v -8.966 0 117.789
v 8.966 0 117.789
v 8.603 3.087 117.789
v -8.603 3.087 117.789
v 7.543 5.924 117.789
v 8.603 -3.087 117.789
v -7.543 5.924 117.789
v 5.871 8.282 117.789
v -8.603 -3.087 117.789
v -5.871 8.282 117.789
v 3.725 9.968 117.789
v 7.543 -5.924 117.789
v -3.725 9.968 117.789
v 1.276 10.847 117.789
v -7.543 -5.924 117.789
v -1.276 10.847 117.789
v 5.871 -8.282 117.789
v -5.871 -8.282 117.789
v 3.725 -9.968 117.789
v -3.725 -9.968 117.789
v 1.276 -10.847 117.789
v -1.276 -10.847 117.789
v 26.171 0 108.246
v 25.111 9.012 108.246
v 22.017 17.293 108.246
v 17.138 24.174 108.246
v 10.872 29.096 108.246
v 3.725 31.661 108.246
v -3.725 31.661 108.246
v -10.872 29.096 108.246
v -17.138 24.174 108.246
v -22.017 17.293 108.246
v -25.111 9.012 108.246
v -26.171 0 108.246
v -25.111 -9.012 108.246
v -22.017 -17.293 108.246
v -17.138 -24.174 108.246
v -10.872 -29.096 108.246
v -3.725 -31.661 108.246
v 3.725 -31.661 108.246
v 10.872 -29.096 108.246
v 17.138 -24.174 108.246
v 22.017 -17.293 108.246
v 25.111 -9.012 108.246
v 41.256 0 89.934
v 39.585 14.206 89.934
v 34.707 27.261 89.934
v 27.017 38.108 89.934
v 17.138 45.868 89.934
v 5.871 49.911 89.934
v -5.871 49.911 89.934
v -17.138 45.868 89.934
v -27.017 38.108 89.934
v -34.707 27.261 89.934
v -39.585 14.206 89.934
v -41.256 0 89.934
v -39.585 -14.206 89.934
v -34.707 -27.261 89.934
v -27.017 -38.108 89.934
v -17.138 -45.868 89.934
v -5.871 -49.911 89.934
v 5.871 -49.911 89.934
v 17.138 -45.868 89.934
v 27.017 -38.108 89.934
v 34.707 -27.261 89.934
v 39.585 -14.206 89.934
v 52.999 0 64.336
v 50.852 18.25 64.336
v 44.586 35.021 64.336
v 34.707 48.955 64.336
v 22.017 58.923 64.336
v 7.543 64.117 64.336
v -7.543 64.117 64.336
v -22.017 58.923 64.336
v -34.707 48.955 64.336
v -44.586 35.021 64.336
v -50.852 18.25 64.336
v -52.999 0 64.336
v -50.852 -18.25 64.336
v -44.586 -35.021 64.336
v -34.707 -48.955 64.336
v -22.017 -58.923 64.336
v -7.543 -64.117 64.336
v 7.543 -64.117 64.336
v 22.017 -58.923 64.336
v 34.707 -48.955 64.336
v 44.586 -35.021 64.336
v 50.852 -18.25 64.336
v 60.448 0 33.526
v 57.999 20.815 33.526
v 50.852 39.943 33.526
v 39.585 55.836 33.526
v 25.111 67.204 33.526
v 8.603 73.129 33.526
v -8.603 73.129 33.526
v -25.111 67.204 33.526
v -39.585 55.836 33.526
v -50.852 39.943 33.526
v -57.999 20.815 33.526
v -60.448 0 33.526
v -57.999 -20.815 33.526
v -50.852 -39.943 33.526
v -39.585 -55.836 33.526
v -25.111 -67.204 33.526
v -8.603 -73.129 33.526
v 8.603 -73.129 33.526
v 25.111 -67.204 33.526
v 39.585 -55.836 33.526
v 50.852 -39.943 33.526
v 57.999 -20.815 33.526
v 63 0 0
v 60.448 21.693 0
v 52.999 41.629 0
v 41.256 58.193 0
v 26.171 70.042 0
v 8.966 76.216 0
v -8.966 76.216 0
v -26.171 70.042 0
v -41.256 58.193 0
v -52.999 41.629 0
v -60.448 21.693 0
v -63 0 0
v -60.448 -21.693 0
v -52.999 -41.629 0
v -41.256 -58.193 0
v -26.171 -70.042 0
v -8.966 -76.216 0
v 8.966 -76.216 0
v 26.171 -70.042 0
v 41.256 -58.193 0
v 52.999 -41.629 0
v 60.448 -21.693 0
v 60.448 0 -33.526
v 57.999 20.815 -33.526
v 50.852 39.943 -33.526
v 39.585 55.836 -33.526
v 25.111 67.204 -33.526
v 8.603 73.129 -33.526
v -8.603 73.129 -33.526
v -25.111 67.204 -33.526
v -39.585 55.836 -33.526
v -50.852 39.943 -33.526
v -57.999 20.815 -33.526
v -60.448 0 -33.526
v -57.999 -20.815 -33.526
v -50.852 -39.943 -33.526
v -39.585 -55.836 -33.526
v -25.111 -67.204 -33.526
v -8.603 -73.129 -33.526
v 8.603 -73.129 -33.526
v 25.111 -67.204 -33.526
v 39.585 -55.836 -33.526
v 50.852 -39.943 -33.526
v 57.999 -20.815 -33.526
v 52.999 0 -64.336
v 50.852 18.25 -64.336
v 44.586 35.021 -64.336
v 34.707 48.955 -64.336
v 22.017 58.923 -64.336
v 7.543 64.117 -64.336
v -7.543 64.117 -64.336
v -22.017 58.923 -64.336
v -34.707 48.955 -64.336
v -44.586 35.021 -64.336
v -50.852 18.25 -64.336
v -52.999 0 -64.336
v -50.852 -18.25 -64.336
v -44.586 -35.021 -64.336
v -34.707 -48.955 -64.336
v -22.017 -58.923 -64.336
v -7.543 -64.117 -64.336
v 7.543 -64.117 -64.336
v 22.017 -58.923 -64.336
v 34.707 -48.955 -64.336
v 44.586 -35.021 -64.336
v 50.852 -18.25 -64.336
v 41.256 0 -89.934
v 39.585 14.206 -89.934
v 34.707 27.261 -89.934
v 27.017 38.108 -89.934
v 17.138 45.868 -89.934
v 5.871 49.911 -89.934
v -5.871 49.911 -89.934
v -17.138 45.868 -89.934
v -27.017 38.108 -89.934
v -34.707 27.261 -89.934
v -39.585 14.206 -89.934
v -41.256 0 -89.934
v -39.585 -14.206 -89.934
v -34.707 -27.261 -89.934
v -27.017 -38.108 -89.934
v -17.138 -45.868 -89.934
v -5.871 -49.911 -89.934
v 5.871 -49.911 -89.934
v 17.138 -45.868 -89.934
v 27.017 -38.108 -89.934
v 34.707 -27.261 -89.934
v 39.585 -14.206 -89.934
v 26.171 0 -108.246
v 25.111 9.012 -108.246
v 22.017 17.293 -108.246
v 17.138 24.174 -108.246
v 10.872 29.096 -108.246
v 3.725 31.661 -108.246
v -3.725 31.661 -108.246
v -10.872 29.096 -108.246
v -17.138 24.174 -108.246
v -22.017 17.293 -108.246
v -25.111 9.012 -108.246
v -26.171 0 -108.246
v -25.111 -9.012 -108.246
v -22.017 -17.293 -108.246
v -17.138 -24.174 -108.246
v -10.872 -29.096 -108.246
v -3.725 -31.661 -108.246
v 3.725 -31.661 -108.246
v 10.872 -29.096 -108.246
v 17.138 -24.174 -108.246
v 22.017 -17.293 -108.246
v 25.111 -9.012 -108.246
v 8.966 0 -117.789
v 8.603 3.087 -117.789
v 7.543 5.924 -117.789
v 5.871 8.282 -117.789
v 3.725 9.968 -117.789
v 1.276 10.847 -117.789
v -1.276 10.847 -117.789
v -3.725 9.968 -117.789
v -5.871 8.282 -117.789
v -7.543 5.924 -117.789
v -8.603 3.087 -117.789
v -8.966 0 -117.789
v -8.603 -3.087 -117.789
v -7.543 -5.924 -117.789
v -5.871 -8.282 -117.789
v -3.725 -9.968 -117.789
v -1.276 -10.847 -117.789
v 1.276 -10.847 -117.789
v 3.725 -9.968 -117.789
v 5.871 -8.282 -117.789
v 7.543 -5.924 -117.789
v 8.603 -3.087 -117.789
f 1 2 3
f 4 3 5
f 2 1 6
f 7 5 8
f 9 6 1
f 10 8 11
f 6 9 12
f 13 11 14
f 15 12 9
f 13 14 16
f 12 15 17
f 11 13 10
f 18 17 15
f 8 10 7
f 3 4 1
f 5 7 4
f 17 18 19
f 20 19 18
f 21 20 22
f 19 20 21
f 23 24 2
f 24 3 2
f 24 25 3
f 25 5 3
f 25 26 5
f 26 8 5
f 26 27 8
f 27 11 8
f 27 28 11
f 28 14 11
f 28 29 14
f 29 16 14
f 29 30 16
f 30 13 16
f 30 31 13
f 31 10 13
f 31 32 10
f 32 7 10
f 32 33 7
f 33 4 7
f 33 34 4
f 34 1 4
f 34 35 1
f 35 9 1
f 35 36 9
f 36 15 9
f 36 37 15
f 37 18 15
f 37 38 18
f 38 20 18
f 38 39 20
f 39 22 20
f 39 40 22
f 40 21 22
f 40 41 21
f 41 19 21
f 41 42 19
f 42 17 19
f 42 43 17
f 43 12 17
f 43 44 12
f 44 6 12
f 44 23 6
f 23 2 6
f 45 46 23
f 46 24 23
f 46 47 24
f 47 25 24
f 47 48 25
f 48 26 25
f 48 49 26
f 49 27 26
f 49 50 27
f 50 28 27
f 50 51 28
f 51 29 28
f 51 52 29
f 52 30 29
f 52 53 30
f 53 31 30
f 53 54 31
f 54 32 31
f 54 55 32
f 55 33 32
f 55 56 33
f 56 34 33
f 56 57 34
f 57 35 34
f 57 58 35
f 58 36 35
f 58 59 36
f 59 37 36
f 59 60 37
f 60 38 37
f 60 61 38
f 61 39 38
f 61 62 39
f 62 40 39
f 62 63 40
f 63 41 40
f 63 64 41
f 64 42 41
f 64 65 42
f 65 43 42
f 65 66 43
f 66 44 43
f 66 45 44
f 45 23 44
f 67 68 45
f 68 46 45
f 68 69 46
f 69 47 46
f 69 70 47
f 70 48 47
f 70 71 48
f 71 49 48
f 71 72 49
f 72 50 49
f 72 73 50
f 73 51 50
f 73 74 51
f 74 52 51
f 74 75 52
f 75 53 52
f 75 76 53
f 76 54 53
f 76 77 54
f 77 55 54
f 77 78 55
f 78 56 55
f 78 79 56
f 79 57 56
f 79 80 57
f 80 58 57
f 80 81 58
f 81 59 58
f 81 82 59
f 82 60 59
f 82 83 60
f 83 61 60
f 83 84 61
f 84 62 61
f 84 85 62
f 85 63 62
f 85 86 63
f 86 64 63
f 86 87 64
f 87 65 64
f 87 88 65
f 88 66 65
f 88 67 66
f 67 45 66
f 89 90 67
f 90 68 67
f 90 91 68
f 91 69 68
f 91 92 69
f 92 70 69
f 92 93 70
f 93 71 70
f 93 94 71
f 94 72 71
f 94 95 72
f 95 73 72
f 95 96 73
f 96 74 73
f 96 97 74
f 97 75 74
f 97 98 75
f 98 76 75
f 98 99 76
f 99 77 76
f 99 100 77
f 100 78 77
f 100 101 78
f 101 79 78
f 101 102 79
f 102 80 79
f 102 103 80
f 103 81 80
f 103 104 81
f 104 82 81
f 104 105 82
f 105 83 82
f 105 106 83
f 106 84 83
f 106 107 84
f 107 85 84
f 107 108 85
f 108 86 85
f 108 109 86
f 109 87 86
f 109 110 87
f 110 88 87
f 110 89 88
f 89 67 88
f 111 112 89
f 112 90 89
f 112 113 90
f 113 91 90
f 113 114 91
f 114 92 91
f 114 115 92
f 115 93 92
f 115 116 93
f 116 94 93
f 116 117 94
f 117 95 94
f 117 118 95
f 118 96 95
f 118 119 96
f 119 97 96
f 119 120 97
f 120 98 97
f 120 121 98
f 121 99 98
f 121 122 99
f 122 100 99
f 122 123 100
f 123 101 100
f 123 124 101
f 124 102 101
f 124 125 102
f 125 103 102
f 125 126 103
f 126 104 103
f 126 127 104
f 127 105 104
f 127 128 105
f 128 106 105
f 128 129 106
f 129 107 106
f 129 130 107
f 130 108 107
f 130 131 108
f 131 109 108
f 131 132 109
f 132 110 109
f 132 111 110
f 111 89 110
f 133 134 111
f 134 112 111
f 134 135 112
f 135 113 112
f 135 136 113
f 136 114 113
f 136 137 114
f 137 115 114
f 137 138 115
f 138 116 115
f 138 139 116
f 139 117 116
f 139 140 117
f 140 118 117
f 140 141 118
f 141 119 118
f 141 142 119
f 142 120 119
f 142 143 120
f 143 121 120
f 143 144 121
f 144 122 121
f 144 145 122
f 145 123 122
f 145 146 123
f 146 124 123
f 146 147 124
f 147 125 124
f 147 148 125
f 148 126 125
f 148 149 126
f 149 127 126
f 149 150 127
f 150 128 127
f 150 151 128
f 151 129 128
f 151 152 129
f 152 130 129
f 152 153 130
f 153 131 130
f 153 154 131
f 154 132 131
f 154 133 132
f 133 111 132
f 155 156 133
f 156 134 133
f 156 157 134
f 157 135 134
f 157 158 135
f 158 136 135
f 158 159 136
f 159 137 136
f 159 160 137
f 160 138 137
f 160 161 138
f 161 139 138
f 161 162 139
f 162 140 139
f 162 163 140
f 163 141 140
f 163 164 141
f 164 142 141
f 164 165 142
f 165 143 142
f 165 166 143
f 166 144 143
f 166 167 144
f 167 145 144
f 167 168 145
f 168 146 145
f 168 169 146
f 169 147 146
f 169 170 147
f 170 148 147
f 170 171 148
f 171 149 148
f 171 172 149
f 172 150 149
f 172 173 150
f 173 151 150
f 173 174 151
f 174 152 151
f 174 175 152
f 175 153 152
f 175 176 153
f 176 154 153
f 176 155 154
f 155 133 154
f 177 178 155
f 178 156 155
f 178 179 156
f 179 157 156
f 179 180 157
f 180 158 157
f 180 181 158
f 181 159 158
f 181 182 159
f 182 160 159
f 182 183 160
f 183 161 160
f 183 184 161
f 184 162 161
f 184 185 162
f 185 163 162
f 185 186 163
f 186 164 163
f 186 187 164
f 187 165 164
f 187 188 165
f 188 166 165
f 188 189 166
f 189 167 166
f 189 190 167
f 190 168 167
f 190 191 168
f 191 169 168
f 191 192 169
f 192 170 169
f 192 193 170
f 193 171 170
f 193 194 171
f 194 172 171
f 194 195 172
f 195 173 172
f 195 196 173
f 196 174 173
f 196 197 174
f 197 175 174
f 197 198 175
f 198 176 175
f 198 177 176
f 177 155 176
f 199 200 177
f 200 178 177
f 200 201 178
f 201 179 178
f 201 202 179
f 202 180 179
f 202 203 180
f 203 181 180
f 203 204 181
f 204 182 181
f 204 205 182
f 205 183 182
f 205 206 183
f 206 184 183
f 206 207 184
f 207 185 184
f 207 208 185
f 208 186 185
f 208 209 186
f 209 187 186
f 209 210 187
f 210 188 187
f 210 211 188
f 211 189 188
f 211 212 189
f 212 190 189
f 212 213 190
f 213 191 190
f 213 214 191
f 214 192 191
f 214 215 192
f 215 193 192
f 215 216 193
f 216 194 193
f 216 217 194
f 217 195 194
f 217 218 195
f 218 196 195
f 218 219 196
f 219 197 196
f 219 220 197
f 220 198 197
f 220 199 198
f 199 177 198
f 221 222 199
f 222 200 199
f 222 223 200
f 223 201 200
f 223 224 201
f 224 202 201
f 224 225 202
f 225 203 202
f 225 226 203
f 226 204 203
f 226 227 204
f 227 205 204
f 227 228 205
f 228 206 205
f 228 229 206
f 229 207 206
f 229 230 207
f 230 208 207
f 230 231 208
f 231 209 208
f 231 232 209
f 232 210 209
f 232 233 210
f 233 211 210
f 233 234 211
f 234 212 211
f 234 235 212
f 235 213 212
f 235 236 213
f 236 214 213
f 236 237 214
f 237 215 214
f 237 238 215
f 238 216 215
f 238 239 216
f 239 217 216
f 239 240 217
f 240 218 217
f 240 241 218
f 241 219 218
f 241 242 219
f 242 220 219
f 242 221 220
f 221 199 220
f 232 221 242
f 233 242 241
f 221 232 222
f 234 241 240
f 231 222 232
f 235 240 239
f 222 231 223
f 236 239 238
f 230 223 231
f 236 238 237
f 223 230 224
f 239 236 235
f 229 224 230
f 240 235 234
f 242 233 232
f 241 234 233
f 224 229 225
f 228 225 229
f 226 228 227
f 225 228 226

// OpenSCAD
// Generated by SolidPython 1.0.1 on 2020-07-29 00:46:48


scale(v = [9, 11, 17]) {
	sphere(r = 7);
}
/***********************************************
*********      SolidPython code:      **********
************************************************
 
# import packages: SolidPython
from solid import *
from solid.utils import *
from itertools import chain, combinations, permutations


class Resize:

    def __init__(self, scad_file):
        self.scad_file = scad_file
        #self.scad_file = import_scad(scad_file)
        # cone/cylinder param:
        self.r1 = 0
        self.r2 = 0
        self.h = 0
        # rectangular prism param:
        self.w = 0
        self.l = 0
        # ellipse param:
        self.r = 0

    # import OpenScad code (file name corresponds to shape)


    # classify shape + parameters
    def assign(self, param1, param2, param3):
        if self.scad_file == 'cone.scad':
            self.r1 = param1
            self.r2 = param2
            self.h = param3
        elif self.scad_file == 'cylinder.scad':
            self.r1 = param1
            self.r2 = param2
            self.h = param3
        elif self.scad_file == 'rectangularPrism.scad':
            self.h = param1
            self.l = param2
            self.w = param3
        else:
            self.r = param1
            self.h = param2

    # resize parameters
    def iterate(self):
        x = range(3, 20, 2)
        i = 1
        if self.scad_file == 'cone.scad':
            tempList = list(permutations(x, 2))
            for temp in tempList:
                param1 = temp[0]
                param2 = temp[1]
                filepath = 'produced_scad_files/' + 'cone' + str(param1) + '_' + str(param2) + '_' + '.scad'
                scad_render_to_file(cylinder(h=param1, r1=param2, r2=0), filepath)

        elif self.scad_file == 'cylinder.scad':
            tempList = list(permutations(x, 3))
            for temp in tempList:
                param1 = temp[0]
                param2 = temp[1]
                filepath = 'produced_scad_files/' + 'cylinder' + str(param1) + '_' + str(param2) + '_' + '.scad'
                scad_render_to_file(cylinder(h=param1, r1=param2, r2=param2), filepath)

        elif self.scad_file == 'rectangularPrism.scad':
            tempList = list(permutations(x, 3))
            for temp in tempList:
                param1 = temp[0]
                param2 = temp[1]
                param3 = temp[2]
                filepath = 'produced_scad_files/' + 'rectangularPrism' + str(param1) + '_' + str(param2) + '_' + str(
                    param3) + '.scad'
                scad_render_to_file(cube(size=(param1, param2, param3)), filepath)

        elif self.scad_file == 'ellipse.scad':
            tempList = list(permutations(x, 4))
            for temp in tempList:
                param1 = temp[0]
                param2 = temp[1]
                param3 = temp[2]
                param4 = temp[3]
                filepath = 'produced_scad_files/' + 'ellipse' + str(param1) + '_' + str(param2) + '_' + str(param3) + '_' + str(param4) + '.scad'
                scad_render_to_file(scale([param1, param2, param3])(sphere(r=param4)), filepath)

    def render_to_scadfile(self):
        scad_render_to_file(scad, 'example.scad') 
 
************************************************/
